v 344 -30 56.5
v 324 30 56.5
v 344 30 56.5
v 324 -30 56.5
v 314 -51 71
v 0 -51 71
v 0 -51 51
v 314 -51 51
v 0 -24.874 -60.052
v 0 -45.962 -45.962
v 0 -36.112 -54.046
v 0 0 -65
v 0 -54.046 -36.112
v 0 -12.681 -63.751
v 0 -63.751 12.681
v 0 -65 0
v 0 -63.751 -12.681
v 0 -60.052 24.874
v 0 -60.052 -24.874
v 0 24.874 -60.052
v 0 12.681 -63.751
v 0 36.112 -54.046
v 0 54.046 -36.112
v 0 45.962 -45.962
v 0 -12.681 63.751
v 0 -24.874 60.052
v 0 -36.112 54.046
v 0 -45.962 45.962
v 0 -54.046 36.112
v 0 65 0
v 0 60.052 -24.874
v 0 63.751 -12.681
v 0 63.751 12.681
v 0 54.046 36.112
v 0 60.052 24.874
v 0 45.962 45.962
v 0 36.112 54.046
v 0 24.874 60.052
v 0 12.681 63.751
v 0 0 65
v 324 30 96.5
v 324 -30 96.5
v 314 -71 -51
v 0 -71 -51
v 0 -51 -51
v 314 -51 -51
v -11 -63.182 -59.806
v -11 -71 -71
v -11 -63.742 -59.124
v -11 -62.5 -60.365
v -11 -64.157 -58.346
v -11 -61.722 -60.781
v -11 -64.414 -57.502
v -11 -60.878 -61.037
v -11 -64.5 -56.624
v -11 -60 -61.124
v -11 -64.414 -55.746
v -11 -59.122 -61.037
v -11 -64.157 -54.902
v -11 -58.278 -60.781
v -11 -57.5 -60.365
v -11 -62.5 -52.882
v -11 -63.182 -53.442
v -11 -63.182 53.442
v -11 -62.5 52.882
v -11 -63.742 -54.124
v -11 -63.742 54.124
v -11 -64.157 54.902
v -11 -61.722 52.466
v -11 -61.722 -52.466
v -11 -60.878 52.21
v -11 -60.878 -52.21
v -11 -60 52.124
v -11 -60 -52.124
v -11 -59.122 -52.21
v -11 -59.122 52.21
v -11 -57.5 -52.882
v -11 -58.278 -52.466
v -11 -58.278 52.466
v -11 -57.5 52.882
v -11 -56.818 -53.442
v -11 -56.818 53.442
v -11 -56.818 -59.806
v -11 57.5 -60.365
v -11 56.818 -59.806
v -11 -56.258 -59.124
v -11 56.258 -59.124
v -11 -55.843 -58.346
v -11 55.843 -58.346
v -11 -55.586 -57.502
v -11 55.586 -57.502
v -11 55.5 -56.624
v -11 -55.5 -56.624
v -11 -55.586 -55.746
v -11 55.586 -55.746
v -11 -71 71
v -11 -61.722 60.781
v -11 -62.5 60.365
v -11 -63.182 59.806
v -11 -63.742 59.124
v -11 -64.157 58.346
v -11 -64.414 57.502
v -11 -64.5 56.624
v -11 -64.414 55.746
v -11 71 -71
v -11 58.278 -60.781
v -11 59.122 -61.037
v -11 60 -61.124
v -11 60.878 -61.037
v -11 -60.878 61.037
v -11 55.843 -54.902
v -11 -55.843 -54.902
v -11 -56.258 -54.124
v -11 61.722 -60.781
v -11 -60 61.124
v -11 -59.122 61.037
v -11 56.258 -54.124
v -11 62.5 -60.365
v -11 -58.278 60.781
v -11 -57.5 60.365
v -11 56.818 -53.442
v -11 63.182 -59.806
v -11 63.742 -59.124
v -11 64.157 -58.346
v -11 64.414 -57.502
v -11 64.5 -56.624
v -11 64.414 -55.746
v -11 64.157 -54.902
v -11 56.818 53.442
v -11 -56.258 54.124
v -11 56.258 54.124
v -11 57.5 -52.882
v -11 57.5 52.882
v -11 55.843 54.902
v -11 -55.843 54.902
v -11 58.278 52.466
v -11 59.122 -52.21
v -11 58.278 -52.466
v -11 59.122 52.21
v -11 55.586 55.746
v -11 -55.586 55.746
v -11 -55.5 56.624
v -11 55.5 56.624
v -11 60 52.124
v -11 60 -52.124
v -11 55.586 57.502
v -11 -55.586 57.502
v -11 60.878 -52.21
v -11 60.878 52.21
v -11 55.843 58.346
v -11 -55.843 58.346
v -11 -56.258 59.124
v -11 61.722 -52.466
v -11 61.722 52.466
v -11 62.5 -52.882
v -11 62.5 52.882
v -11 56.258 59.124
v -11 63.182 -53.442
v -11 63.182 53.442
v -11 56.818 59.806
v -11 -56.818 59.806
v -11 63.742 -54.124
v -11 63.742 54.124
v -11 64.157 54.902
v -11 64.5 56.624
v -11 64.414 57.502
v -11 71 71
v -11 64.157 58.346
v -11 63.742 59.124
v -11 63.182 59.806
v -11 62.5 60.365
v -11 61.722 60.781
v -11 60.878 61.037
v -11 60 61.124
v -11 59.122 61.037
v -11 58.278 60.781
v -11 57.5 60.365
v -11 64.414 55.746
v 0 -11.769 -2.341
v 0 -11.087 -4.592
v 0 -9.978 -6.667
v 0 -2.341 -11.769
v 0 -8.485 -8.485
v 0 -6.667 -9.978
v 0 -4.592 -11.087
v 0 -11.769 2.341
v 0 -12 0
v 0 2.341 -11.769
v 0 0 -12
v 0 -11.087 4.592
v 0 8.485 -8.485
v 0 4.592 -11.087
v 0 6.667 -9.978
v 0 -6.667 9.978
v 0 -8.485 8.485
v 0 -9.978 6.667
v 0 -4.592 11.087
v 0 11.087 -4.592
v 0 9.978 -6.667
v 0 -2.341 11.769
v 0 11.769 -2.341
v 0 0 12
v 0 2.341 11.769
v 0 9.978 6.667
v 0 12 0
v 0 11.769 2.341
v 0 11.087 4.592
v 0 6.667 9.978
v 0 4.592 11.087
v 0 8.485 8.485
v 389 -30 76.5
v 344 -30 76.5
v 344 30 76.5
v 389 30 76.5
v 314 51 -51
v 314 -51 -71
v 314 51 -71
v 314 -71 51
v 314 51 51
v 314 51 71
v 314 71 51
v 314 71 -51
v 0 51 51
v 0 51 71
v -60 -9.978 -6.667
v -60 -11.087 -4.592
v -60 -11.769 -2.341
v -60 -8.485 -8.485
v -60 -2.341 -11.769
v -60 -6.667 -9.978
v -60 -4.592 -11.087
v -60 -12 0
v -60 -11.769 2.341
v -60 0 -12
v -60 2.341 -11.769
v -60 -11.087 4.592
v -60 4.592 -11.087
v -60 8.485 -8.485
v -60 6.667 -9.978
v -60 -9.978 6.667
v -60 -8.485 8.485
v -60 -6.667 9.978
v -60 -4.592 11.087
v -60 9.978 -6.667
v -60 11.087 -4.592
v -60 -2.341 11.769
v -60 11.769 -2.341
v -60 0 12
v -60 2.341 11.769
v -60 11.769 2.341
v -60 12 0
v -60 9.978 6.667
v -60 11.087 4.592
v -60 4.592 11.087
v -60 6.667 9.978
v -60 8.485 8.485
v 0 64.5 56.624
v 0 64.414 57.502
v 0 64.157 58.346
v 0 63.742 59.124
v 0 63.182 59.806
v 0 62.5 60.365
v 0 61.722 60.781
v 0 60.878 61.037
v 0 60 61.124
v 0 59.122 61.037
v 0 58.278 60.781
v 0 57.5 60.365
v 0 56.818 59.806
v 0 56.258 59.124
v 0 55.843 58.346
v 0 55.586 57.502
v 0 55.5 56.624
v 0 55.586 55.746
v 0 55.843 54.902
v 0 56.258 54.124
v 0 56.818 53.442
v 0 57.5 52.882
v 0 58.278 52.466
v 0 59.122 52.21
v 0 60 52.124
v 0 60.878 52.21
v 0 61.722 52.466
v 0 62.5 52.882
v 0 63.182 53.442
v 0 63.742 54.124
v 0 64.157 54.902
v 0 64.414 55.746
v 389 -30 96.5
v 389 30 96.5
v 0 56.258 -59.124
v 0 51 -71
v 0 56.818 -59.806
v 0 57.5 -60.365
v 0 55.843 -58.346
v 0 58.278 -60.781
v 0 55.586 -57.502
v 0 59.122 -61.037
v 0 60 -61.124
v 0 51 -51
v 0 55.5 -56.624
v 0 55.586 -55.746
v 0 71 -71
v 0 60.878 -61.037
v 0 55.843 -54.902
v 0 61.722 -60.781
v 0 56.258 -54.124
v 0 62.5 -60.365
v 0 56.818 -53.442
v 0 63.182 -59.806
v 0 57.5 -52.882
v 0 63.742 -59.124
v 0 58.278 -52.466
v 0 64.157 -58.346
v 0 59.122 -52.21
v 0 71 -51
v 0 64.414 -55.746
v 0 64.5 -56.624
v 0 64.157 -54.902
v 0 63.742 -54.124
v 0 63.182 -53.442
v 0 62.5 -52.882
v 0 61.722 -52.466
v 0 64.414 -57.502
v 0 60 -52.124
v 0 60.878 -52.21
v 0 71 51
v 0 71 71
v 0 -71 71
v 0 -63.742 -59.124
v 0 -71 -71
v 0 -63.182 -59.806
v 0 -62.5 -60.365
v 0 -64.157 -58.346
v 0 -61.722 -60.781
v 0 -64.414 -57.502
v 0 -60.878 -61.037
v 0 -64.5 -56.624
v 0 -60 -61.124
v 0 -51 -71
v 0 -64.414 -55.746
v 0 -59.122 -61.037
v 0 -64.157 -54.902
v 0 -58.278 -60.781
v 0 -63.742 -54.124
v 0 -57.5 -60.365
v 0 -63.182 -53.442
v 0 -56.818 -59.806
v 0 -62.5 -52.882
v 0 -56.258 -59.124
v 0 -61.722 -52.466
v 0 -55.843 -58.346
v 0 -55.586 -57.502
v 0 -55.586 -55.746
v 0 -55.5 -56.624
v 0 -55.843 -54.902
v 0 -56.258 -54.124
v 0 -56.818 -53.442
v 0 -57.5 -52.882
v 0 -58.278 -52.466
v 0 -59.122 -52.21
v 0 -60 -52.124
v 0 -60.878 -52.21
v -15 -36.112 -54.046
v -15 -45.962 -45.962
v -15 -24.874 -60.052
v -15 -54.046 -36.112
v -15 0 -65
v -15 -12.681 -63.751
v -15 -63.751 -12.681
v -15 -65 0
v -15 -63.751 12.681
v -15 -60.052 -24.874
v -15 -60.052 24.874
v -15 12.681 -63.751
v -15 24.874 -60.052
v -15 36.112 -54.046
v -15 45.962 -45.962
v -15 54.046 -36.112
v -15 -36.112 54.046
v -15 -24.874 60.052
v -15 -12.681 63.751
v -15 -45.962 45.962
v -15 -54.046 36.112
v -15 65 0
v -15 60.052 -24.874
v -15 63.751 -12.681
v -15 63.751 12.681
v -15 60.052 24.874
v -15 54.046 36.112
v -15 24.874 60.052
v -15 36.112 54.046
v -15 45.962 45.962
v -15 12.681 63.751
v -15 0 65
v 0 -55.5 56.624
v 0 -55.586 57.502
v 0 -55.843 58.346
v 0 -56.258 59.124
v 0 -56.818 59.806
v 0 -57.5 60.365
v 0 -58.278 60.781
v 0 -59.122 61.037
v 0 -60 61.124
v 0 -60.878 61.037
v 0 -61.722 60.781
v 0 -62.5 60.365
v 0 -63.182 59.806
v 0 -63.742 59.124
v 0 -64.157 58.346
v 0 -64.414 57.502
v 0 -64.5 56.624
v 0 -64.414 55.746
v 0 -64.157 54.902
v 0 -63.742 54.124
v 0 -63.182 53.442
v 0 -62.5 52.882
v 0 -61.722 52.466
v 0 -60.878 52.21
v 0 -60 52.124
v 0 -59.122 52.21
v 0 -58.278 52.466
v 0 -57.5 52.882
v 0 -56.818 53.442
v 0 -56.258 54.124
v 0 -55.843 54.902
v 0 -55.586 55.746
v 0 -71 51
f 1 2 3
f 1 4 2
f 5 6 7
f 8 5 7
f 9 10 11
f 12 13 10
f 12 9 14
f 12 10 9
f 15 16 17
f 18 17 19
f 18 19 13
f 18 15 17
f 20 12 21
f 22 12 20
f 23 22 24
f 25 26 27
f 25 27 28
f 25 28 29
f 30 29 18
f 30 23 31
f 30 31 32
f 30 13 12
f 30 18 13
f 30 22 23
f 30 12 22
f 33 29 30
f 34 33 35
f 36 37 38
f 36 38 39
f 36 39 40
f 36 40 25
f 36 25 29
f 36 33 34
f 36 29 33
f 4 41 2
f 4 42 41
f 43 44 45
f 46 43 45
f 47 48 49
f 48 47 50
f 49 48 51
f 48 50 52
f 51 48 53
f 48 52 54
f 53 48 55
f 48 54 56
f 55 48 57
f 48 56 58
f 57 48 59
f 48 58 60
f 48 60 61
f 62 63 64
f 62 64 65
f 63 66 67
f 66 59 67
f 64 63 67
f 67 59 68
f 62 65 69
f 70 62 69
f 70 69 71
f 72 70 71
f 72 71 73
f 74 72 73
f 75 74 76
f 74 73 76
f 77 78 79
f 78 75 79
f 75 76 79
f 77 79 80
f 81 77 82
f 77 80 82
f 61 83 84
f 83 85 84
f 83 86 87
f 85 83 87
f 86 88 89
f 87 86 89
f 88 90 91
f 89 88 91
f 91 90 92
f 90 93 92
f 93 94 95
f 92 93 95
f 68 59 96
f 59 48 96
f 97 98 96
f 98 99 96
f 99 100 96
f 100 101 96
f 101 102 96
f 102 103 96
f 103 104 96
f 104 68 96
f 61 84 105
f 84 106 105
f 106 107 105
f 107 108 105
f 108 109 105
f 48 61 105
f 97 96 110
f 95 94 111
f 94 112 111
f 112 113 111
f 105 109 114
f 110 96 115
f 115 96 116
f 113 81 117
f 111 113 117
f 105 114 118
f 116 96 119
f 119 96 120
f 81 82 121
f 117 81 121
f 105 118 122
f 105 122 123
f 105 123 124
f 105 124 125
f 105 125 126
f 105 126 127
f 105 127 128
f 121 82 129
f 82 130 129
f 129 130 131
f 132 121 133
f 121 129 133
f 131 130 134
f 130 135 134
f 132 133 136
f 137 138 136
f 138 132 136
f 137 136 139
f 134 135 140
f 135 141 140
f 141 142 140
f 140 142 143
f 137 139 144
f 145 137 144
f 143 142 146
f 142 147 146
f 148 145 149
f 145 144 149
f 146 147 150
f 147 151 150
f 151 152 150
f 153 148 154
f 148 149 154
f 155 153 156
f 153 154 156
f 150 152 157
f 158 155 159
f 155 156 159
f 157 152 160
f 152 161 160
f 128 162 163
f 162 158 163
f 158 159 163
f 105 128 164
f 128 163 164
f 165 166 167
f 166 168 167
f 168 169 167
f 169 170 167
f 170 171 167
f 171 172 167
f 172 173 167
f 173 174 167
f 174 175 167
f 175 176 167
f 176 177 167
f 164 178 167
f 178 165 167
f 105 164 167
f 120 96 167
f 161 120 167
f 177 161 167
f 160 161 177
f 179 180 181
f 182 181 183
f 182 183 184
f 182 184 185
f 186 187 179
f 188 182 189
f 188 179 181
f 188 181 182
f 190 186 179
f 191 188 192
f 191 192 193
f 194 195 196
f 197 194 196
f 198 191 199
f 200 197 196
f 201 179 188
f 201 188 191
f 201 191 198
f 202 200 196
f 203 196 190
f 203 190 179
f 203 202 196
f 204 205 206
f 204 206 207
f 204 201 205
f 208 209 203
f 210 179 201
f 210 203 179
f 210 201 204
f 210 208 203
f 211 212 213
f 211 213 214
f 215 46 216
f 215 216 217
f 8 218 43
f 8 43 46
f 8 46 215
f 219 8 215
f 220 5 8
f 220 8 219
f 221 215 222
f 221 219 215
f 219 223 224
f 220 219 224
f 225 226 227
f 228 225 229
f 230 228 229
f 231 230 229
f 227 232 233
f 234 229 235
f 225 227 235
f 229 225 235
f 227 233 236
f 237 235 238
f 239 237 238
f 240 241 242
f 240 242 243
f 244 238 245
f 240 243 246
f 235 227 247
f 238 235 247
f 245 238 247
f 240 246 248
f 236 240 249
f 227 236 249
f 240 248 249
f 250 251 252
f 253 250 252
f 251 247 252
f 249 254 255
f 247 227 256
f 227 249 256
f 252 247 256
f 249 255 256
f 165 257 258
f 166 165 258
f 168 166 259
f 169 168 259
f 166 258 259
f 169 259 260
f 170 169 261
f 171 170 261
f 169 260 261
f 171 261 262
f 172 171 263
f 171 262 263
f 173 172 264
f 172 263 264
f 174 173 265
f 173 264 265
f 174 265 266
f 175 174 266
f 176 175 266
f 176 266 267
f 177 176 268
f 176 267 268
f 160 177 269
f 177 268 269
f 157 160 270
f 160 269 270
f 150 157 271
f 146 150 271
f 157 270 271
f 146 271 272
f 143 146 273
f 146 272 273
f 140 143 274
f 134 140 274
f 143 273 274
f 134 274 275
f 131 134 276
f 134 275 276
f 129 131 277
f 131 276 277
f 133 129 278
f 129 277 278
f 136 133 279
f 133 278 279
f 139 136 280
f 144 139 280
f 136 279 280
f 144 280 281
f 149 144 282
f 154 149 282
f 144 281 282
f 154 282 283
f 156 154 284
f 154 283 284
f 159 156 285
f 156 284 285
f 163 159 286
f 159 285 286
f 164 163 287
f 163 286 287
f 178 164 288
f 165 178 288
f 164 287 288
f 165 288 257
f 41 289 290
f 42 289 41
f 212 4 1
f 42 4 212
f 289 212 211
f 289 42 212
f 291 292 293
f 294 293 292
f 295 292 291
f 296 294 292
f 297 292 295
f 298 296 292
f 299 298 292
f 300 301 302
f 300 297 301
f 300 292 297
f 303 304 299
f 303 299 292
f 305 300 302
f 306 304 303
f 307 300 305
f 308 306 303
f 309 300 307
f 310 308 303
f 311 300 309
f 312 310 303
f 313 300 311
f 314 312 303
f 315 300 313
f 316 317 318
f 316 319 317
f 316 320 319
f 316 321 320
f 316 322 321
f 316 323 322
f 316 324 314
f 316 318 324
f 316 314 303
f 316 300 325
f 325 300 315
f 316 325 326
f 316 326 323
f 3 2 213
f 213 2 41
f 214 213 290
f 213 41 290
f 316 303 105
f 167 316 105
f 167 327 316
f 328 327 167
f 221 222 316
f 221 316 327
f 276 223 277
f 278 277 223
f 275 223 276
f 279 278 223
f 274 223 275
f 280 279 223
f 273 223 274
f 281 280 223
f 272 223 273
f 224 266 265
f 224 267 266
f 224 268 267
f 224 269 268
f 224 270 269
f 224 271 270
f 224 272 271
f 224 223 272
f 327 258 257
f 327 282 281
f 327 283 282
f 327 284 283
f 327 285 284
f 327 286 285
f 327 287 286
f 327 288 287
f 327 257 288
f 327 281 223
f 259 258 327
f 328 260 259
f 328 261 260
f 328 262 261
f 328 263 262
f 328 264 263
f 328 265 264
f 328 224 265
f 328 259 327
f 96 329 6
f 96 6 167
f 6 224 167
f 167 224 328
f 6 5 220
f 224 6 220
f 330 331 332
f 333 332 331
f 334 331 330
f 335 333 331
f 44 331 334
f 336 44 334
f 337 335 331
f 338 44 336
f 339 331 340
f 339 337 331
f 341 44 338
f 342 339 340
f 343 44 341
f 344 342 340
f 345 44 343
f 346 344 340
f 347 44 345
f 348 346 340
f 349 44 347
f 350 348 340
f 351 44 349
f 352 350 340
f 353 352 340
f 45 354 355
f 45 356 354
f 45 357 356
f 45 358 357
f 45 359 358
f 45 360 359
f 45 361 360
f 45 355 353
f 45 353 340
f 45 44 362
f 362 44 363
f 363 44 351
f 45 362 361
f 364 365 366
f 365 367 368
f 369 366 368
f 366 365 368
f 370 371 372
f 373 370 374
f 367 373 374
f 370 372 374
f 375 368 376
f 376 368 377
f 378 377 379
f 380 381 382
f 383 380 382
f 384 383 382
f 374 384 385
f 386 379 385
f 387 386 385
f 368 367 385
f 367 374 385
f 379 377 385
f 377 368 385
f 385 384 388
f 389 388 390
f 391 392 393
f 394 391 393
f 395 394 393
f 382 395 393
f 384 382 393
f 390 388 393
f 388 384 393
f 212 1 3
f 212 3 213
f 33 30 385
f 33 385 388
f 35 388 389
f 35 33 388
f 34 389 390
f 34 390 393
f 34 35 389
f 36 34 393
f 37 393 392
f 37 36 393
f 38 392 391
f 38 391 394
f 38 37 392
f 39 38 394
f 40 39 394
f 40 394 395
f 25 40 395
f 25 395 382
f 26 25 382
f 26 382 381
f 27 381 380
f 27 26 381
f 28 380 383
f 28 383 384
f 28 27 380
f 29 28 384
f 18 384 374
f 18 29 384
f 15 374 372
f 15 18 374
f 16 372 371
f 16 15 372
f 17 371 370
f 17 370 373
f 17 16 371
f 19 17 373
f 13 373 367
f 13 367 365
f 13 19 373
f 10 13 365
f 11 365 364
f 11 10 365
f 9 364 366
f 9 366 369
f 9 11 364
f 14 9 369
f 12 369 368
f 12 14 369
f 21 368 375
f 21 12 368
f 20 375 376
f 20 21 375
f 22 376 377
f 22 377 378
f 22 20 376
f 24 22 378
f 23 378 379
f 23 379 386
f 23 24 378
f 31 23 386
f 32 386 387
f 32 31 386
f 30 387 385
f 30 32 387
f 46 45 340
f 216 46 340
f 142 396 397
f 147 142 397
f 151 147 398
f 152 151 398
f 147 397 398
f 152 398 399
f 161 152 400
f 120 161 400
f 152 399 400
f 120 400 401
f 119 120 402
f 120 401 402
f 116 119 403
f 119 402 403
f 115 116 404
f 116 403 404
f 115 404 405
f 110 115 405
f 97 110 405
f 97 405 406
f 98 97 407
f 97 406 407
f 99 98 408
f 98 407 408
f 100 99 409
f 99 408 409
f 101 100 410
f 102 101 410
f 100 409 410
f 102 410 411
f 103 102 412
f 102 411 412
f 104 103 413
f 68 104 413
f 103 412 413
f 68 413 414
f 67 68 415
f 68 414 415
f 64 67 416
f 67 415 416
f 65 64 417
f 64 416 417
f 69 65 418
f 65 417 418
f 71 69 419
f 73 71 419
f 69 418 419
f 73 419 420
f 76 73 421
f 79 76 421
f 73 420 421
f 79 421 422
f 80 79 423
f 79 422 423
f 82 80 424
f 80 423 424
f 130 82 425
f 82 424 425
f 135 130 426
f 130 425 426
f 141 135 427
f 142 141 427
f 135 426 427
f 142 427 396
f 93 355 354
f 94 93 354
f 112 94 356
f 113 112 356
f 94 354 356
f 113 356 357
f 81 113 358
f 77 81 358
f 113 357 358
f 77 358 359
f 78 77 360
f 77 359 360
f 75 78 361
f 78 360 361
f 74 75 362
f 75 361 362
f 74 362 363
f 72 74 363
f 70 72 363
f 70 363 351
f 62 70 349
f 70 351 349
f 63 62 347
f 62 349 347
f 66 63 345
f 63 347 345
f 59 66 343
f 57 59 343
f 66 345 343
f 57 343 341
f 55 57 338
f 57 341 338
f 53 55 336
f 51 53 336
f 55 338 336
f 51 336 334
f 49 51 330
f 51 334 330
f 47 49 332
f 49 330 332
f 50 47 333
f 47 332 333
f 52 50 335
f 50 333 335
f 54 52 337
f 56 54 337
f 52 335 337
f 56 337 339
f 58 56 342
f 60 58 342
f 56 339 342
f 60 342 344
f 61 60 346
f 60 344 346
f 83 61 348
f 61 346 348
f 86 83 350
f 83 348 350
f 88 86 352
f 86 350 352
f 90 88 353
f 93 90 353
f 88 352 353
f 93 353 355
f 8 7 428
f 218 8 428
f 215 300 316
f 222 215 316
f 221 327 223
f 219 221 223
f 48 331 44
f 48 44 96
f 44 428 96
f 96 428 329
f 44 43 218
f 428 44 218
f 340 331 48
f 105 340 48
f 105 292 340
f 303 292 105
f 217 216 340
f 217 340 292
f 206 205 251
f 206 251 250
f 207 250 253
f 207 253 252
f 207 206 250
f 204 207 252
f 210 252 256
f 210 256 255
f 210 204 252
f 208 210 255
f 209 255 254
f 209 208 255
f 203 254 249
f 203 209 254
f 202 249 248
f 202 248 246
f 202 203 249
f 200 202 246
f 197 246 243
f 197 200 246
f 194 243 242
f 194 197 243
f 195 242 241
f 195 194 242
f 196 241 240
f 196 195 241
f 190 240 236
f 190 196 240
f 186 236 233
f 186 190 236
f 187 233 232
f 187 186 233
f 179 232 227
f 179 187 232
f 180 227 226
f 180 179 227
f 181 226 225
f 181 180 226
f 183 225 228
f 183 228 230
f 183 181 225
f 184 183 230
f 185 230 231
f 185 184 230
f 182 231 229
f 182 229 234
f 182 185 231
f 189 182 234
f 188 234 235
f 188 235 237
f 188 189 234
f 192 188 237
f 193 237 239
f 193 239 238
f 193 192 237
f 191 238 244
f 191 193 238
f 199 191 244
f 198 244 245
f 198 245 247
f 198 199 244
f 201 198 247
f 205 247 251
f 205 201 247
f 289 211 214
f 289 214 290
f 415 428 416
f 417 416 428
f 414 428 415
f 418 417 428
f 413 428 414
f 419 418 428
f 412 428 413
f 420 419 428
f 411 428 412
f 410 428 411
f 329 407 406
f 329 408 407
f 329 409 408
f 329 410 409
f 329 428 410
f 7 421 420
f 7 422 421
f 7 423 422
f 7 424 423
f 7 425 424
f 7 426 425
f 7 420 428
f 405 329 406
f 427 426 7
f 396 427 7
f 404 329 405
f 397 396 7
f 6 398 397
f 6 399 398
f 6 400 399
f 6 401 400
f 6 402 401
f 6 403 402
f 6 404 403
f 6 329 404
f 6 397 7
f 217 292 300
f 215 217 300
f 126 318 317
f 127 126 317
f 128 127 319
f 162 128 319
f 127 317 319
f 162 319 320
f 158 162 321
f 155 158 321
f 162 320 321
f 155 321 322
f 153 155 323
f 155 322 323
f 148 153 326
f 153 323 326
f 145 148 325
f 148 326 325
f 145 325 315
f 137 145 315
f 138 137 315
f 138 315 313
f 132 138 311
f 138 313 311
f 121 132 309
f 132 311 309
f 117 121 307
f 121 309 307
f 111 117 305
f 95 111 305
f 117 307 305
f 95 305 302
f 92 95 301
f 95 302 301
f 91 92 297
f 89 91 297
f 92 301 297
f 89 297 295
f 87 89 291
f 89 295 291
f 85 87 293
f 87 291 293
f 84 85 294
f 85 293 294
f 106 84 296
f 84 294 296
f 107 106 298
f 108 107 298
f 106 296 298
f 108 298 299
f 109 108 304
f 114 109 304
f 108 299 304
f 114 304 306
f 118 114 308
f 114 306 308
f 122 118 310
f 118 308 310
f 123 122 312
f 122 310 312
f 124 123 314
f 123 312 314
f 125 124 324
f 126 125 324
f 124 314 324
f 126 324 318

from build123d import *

# Parameters (mm, degrees)
F1_DEPTH = 314
F6_W     = 142
F6_H     = 142
F6_R     = 4.5
F2_DEPTH = 11
F3_R     = 12
F7_DEPTH = 60
F8_R     = 65
F4_DEPTH = 15
F5_DEPTH = 30


with BuildPart() as f1:
    # F0 (on Right) → F1 (new body)
    with BuildSketch(Plane.YZ):
        Polygon((-51, -51), (-51, -71), (51, -71), (51, -51), (71, -51), (71, 51), (51, 51), (51, 71), (-51, 71), (-51, 51), (-71, 51), (-71, -51), align=None)
    extrude(amount=F1_DEPTH)

    # F6 (on Right) → F2 (join)
    with BuildSketch(Plane.YZ):
        Rectangle(F6_W, F6_H)
        with Locations((-60, -56.623758)):
            Circle(F6_R, mode=Mode.SUBTRACT)
        with Locations((60, -56.623758)):
            Circle(F6_R, mode=Mode.SUBTRACT)
        with Locations((-60, 56.623758)):
            Circle(F6_R, mode=Mode.SUBTRACT)
        with Locations((60, 56.623758)):
            Circle(F6_R, mode=Mode.SUBTRACT)
    extrude(amount=-F2_DEPTH)


with BuildPart() as f7:
    # F3 (on Right) → F7 (new body)
    with BuildSketch(Plane.YZ):
        Circle(F3_R)
    extrude(amount=-F7_DEPTH)


with BuildPart() as f4:
    # F8 (on Right) → F4 (new body)
    with BuildSketch(Plane.YZ):
        Circle(F8_R)
    extrude(amount=-F4_DEPTH)


with BuildPart() as f5:
    # F9 (on Front) → F5 (new body, symmetric)
    with BuildSketch(Plane.XZ):
        Polygon((324, 76.5), (324, 56.5), (344, 56.5), (344, 76.5), (389, 76.5), (389, 96.5), (324, 96.5), align=None)
    extrude(amount=F5_DEPTH, both=True)


solid = Compound([f1.part, f7.part, f4.part, f5.part])
